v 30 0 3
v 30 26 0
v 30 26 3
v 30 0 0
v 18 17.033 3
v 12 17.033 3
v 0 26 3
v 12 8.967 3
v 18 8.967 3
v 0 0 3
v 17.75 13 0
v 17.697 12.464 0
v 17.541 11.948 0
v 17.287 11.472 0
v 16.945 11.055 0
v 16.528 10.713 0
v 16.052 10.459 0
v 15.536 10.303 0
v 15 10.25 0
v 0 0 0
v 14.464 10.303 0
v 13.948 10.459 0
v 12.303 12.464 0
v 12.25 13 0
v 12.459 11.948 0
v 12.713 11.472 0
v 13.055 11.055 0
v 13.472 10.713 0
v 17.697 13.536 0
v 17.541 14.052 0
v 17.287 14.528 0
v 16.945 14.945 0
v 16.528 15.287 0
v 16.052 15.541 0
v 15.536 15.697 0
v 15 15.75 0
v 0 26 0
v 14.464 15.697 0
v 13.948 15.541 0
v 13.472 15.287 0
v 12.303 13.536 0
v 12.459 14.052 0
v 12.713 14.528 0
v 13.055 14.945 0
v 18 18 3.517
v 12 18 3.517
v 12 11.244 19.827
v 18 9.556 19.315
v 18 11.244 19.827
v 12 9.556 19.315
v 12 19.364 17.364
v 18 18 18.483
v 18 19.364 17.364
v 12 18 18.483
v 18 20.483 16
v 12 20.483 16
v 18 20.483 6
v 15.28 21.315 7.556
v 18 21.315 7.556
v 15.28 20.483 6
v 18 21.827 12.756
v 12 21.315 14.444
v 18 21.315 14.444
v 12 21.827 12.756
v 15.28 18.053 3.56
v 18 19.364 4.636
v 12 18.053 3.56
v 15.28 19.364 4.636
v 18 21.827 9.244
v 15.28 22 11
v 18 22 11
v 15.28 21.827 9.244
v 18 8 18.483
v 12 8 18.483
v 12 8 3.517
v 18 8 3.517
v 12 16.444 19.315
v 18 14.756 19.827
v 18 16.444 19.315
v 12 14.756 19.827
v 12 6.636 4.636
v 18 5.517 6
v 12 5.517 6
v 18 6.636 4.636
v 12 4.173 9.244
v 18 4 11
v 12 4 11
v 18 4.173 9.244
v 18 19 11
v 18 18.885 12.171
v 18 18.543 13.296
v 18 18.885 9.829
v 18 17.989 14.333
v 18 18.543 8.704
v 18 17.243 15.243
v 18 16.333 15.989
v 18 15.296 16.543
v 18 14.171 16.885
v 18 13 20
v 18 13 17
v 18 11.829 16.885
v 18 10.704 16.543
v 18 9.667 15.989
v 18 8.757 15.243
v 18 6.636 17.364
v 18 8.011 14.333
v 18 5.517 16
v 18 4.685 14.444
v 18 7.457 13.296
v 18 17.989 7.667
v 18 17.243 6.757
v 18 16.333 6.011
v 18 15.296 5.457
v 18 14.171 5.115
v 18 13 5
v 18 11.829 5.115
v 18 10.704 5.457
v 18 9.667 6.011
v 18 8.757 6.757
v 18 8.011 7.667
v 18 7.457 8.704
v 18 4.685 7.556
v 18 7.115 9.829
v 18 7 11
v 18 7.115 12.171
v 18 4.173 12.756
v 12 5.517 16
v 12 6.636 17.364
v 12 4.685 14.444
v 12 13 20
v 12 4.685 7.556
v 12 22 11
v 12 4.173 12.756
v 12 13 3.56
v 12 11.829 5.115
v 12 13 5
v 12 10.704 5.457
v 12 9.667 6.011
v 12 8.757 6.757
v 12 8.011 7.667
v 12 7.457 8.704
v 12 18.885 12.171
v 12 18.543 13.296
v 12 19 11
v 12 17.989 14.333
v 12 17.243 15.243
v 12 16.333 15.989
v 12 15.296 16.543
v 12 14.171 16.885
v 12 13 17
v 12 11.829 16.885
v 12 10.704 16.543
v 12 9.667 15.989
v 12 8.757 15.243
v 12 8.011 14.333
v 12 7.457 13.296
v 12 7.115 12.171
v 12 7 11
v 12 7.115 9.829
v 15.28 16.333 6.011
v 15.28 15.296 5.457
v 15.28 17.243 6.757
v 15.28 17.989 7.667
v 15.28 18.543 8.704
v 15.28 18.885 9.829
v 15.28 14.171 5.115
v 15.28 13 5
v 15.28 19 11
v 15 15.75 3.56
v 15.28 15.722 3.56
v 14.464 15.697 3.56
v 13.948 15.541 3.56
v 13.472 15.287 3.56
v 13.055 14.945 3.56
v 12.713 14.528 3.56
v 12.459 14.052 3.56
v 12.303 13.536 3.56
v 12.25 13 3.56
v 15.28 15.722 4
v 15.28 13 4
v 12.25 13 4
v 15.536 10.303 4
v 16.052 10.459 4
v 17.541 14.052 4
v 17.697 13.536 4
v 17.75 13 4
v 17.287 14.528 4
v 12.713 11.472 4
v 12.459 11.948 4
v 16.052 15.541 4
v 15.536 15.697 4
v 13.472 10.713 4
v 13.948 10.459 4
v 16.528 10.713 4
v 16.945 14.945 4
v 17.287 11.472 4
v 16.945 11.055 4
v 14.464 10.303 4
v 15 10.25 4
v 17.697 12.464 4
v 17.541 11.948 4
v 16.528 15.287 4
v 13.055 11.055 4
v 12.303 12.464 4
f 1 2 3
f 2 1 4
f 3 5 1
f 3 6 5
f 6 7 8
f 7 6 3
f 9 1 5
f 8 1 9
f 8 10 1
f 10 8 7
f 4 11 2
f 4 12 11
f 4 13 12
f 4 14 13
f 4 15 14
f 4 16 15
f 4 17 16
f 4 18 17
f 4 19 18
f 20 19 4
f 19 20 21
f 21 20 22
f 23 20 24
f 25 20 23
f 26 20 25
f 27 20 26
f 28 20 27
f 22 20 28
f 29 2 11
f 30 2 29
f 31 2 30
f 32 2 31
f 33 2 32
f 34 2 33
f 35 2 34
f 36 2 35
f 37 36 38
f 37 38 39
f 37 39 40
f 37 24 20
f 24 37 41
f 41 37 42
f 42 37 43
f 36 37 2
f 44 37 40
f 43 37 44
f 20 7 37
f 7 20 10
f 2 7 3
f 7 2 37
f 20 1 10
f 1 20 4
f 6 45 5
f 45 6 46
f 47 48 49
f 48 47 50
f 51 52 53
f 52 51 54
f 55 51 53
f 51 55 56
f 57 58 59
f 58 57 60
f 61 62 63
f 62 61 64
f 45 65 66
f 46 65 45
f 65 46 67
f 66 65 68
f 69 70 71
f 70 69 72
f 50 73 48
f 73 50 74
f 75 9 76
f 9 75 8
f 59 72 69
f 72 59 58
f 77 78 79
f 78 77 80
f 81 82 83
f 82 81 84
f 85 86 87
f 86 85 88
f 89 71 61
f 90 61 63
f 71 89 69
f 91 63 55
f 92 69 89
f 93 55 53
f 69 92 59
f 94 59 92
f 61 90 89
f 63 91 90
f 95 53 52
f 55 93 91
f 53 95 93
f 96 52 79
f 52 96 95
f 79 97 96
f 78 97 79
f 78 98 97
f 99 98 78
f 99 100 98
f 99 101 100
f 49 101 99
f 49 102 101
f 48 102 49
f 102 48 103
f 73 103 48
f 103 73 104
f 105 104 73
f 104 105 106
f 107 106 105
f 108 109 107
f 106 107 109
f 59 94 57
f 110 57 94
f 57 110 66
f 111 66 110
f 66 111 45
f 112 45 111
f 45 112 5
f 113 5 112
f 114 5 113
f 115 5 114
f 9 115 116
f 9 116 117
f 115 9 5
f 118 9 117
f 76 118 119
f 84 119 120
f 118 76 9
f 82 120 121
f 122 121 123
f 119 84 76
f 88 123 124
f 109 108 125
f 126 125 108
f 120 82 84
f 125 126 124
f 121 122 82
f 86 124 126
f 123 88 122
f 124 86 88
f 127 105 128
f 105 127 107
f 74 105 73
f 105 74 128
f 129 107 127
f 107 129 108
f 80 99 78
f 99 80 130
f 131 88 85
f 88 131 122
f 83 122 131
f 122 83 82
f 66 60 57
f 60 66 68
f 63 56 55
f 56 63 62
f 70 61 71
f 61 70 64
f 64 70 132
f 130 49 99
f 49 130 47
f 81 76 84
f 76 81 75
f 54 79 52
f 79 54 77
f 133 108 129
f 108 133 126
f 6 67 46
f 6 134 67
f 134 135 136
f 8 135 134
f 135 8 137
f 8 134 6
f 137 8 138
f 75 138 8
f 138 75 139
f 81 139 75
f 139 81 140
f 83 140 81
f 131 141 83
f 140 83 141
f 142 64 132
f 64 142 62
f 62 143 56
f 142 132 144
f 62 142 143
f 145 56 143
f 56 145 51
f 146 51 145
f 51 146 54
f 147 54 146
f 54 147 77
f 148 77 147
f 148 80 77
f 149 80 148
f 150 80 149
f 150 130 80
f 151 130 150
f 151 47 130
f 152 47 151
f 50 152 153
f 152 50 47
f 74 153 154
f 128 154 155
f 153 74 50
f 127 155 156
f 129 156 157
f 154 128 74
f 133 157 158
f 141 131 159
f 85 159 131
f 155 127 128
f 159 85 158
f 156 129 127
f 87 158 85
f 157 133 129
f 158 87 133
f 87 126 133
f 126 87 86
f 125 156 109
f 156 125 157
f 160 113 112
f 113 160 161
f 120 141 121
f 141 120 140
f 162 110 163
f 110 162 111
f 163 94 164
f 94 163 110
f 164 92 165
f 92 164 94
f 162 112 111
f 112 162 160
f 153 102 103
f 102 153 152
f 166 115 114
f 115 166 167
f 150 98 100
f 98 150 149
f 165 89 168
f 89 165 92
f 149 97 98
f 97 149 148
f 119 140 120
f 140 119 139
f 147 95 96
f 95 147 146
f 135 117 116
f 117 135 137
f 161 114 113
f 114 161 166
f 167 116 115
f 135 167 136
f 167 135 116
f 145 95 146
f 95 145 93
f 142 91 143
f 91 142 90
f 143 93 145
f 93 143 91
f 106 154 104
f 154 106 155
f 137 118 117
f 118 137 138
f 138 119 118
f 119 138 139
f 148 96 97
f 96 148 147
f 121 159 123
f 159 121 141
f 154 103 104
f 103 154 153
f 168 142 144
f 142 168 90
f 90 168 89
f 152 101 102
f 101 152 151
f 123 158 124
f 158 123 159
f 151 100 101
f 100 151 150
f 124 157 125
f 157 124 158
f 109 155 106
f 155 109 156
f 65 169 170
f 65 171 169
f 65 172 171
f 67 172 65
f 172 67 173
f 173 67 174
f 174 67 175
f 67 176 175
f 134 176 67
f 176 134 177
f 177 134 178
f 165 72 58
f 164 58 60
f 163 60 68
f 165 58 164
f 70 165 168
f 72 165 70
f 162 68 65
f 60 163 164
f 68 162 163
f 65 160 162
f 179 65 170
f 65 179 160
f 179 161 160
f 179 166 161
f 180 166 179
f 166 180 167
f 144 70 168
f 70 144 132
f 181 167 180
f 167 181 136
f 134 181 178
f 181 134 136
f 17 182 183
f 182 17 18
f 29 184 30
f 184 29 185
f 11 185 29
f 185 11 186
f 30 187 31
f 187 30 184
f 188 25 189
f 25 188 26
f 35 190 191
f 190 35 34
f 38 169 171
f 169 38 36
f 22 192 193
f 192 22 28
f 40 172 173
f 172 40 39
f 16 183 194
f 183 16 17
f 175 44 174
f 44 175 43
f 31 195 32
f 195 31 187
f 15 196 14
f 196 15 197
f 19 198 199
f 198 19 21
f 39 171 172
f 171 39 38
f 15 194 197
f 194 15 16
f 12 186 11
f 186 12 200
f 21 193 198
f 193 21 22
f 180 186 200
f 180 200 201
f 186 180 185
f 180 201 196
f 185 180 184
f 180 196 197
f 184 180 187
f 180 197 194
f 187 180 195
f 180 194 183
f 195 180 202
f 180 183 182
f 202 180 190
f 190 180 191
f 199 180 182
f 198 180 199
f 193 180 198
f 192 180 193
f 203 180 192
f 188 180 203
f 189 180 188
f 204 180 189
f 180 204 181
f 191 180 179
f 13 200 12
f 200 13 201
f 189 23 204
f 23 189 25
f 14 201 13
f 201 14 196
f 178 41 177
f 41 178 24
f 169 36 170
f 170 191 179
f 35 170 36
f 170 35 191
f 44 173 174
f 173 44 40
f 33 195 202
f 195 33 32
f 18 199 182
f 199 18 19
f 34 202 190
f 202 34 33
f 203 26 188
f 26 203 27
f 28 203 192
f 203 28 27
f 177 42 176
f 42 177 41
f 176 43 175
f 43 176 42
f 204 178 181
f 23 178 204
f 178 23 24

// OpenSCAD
$fn = 32;

// ----------------------------------------------------------------------
// Cable clip: cable 12 mm, clamp 18 mm, base 30 mm
// ----------------------------------------------------------------------

// --- parameters (mm) ---
base_w = 30;              // base length, X
base_d = 26;              // base width, Y
base_t = 3;               // base thickness
clamp_d = 18;             // clamp outside diameter
wall_t = 3;               // clamp wall
cable_d = 12;             // cable opening
ring_w = 6;               // clamp width along the cable
screw_d = 5.5;            // screw clearance
throat = 7.44;            // snap throat width
sink = 1;                 // overlap of the clamp into the base

module base() {
  cube([base_w, base_d, base_t]);
}

module clamp() {
  translate([base_w / 2, base_d / 2, base_t + clamp_d / 2 - sink]) rotate([0, 90, 0])
    cylinder(h = ring_w, d = clamp_d, center = true);
}

difference() {
  union() {
    base();
    clamp();
  }
  translate([base_w / 2, base_d / 2, base_t + clamp_d / 2 - sink]) rotate([0, 90, 0]) translate([0, 0, -ring_w / 2 - 1]) cylinder(h = ring_w + 2, d = cable_d);
  /* snap throat: the opening is narrower than the cable */
  translate([base_w / 2 - throat / 2, base_d / 2, base_t + clamp_d / 2 - sink]) rotate([0, 90, 0]) translate([0, 0, -ring_w / 2 - 1]) cube([throat, clamp_d + 2, ring_w + 2]);
  translate([15, base_d / 2, -1]) cylinder(h = base_t + 2, d = screw_d);
}
